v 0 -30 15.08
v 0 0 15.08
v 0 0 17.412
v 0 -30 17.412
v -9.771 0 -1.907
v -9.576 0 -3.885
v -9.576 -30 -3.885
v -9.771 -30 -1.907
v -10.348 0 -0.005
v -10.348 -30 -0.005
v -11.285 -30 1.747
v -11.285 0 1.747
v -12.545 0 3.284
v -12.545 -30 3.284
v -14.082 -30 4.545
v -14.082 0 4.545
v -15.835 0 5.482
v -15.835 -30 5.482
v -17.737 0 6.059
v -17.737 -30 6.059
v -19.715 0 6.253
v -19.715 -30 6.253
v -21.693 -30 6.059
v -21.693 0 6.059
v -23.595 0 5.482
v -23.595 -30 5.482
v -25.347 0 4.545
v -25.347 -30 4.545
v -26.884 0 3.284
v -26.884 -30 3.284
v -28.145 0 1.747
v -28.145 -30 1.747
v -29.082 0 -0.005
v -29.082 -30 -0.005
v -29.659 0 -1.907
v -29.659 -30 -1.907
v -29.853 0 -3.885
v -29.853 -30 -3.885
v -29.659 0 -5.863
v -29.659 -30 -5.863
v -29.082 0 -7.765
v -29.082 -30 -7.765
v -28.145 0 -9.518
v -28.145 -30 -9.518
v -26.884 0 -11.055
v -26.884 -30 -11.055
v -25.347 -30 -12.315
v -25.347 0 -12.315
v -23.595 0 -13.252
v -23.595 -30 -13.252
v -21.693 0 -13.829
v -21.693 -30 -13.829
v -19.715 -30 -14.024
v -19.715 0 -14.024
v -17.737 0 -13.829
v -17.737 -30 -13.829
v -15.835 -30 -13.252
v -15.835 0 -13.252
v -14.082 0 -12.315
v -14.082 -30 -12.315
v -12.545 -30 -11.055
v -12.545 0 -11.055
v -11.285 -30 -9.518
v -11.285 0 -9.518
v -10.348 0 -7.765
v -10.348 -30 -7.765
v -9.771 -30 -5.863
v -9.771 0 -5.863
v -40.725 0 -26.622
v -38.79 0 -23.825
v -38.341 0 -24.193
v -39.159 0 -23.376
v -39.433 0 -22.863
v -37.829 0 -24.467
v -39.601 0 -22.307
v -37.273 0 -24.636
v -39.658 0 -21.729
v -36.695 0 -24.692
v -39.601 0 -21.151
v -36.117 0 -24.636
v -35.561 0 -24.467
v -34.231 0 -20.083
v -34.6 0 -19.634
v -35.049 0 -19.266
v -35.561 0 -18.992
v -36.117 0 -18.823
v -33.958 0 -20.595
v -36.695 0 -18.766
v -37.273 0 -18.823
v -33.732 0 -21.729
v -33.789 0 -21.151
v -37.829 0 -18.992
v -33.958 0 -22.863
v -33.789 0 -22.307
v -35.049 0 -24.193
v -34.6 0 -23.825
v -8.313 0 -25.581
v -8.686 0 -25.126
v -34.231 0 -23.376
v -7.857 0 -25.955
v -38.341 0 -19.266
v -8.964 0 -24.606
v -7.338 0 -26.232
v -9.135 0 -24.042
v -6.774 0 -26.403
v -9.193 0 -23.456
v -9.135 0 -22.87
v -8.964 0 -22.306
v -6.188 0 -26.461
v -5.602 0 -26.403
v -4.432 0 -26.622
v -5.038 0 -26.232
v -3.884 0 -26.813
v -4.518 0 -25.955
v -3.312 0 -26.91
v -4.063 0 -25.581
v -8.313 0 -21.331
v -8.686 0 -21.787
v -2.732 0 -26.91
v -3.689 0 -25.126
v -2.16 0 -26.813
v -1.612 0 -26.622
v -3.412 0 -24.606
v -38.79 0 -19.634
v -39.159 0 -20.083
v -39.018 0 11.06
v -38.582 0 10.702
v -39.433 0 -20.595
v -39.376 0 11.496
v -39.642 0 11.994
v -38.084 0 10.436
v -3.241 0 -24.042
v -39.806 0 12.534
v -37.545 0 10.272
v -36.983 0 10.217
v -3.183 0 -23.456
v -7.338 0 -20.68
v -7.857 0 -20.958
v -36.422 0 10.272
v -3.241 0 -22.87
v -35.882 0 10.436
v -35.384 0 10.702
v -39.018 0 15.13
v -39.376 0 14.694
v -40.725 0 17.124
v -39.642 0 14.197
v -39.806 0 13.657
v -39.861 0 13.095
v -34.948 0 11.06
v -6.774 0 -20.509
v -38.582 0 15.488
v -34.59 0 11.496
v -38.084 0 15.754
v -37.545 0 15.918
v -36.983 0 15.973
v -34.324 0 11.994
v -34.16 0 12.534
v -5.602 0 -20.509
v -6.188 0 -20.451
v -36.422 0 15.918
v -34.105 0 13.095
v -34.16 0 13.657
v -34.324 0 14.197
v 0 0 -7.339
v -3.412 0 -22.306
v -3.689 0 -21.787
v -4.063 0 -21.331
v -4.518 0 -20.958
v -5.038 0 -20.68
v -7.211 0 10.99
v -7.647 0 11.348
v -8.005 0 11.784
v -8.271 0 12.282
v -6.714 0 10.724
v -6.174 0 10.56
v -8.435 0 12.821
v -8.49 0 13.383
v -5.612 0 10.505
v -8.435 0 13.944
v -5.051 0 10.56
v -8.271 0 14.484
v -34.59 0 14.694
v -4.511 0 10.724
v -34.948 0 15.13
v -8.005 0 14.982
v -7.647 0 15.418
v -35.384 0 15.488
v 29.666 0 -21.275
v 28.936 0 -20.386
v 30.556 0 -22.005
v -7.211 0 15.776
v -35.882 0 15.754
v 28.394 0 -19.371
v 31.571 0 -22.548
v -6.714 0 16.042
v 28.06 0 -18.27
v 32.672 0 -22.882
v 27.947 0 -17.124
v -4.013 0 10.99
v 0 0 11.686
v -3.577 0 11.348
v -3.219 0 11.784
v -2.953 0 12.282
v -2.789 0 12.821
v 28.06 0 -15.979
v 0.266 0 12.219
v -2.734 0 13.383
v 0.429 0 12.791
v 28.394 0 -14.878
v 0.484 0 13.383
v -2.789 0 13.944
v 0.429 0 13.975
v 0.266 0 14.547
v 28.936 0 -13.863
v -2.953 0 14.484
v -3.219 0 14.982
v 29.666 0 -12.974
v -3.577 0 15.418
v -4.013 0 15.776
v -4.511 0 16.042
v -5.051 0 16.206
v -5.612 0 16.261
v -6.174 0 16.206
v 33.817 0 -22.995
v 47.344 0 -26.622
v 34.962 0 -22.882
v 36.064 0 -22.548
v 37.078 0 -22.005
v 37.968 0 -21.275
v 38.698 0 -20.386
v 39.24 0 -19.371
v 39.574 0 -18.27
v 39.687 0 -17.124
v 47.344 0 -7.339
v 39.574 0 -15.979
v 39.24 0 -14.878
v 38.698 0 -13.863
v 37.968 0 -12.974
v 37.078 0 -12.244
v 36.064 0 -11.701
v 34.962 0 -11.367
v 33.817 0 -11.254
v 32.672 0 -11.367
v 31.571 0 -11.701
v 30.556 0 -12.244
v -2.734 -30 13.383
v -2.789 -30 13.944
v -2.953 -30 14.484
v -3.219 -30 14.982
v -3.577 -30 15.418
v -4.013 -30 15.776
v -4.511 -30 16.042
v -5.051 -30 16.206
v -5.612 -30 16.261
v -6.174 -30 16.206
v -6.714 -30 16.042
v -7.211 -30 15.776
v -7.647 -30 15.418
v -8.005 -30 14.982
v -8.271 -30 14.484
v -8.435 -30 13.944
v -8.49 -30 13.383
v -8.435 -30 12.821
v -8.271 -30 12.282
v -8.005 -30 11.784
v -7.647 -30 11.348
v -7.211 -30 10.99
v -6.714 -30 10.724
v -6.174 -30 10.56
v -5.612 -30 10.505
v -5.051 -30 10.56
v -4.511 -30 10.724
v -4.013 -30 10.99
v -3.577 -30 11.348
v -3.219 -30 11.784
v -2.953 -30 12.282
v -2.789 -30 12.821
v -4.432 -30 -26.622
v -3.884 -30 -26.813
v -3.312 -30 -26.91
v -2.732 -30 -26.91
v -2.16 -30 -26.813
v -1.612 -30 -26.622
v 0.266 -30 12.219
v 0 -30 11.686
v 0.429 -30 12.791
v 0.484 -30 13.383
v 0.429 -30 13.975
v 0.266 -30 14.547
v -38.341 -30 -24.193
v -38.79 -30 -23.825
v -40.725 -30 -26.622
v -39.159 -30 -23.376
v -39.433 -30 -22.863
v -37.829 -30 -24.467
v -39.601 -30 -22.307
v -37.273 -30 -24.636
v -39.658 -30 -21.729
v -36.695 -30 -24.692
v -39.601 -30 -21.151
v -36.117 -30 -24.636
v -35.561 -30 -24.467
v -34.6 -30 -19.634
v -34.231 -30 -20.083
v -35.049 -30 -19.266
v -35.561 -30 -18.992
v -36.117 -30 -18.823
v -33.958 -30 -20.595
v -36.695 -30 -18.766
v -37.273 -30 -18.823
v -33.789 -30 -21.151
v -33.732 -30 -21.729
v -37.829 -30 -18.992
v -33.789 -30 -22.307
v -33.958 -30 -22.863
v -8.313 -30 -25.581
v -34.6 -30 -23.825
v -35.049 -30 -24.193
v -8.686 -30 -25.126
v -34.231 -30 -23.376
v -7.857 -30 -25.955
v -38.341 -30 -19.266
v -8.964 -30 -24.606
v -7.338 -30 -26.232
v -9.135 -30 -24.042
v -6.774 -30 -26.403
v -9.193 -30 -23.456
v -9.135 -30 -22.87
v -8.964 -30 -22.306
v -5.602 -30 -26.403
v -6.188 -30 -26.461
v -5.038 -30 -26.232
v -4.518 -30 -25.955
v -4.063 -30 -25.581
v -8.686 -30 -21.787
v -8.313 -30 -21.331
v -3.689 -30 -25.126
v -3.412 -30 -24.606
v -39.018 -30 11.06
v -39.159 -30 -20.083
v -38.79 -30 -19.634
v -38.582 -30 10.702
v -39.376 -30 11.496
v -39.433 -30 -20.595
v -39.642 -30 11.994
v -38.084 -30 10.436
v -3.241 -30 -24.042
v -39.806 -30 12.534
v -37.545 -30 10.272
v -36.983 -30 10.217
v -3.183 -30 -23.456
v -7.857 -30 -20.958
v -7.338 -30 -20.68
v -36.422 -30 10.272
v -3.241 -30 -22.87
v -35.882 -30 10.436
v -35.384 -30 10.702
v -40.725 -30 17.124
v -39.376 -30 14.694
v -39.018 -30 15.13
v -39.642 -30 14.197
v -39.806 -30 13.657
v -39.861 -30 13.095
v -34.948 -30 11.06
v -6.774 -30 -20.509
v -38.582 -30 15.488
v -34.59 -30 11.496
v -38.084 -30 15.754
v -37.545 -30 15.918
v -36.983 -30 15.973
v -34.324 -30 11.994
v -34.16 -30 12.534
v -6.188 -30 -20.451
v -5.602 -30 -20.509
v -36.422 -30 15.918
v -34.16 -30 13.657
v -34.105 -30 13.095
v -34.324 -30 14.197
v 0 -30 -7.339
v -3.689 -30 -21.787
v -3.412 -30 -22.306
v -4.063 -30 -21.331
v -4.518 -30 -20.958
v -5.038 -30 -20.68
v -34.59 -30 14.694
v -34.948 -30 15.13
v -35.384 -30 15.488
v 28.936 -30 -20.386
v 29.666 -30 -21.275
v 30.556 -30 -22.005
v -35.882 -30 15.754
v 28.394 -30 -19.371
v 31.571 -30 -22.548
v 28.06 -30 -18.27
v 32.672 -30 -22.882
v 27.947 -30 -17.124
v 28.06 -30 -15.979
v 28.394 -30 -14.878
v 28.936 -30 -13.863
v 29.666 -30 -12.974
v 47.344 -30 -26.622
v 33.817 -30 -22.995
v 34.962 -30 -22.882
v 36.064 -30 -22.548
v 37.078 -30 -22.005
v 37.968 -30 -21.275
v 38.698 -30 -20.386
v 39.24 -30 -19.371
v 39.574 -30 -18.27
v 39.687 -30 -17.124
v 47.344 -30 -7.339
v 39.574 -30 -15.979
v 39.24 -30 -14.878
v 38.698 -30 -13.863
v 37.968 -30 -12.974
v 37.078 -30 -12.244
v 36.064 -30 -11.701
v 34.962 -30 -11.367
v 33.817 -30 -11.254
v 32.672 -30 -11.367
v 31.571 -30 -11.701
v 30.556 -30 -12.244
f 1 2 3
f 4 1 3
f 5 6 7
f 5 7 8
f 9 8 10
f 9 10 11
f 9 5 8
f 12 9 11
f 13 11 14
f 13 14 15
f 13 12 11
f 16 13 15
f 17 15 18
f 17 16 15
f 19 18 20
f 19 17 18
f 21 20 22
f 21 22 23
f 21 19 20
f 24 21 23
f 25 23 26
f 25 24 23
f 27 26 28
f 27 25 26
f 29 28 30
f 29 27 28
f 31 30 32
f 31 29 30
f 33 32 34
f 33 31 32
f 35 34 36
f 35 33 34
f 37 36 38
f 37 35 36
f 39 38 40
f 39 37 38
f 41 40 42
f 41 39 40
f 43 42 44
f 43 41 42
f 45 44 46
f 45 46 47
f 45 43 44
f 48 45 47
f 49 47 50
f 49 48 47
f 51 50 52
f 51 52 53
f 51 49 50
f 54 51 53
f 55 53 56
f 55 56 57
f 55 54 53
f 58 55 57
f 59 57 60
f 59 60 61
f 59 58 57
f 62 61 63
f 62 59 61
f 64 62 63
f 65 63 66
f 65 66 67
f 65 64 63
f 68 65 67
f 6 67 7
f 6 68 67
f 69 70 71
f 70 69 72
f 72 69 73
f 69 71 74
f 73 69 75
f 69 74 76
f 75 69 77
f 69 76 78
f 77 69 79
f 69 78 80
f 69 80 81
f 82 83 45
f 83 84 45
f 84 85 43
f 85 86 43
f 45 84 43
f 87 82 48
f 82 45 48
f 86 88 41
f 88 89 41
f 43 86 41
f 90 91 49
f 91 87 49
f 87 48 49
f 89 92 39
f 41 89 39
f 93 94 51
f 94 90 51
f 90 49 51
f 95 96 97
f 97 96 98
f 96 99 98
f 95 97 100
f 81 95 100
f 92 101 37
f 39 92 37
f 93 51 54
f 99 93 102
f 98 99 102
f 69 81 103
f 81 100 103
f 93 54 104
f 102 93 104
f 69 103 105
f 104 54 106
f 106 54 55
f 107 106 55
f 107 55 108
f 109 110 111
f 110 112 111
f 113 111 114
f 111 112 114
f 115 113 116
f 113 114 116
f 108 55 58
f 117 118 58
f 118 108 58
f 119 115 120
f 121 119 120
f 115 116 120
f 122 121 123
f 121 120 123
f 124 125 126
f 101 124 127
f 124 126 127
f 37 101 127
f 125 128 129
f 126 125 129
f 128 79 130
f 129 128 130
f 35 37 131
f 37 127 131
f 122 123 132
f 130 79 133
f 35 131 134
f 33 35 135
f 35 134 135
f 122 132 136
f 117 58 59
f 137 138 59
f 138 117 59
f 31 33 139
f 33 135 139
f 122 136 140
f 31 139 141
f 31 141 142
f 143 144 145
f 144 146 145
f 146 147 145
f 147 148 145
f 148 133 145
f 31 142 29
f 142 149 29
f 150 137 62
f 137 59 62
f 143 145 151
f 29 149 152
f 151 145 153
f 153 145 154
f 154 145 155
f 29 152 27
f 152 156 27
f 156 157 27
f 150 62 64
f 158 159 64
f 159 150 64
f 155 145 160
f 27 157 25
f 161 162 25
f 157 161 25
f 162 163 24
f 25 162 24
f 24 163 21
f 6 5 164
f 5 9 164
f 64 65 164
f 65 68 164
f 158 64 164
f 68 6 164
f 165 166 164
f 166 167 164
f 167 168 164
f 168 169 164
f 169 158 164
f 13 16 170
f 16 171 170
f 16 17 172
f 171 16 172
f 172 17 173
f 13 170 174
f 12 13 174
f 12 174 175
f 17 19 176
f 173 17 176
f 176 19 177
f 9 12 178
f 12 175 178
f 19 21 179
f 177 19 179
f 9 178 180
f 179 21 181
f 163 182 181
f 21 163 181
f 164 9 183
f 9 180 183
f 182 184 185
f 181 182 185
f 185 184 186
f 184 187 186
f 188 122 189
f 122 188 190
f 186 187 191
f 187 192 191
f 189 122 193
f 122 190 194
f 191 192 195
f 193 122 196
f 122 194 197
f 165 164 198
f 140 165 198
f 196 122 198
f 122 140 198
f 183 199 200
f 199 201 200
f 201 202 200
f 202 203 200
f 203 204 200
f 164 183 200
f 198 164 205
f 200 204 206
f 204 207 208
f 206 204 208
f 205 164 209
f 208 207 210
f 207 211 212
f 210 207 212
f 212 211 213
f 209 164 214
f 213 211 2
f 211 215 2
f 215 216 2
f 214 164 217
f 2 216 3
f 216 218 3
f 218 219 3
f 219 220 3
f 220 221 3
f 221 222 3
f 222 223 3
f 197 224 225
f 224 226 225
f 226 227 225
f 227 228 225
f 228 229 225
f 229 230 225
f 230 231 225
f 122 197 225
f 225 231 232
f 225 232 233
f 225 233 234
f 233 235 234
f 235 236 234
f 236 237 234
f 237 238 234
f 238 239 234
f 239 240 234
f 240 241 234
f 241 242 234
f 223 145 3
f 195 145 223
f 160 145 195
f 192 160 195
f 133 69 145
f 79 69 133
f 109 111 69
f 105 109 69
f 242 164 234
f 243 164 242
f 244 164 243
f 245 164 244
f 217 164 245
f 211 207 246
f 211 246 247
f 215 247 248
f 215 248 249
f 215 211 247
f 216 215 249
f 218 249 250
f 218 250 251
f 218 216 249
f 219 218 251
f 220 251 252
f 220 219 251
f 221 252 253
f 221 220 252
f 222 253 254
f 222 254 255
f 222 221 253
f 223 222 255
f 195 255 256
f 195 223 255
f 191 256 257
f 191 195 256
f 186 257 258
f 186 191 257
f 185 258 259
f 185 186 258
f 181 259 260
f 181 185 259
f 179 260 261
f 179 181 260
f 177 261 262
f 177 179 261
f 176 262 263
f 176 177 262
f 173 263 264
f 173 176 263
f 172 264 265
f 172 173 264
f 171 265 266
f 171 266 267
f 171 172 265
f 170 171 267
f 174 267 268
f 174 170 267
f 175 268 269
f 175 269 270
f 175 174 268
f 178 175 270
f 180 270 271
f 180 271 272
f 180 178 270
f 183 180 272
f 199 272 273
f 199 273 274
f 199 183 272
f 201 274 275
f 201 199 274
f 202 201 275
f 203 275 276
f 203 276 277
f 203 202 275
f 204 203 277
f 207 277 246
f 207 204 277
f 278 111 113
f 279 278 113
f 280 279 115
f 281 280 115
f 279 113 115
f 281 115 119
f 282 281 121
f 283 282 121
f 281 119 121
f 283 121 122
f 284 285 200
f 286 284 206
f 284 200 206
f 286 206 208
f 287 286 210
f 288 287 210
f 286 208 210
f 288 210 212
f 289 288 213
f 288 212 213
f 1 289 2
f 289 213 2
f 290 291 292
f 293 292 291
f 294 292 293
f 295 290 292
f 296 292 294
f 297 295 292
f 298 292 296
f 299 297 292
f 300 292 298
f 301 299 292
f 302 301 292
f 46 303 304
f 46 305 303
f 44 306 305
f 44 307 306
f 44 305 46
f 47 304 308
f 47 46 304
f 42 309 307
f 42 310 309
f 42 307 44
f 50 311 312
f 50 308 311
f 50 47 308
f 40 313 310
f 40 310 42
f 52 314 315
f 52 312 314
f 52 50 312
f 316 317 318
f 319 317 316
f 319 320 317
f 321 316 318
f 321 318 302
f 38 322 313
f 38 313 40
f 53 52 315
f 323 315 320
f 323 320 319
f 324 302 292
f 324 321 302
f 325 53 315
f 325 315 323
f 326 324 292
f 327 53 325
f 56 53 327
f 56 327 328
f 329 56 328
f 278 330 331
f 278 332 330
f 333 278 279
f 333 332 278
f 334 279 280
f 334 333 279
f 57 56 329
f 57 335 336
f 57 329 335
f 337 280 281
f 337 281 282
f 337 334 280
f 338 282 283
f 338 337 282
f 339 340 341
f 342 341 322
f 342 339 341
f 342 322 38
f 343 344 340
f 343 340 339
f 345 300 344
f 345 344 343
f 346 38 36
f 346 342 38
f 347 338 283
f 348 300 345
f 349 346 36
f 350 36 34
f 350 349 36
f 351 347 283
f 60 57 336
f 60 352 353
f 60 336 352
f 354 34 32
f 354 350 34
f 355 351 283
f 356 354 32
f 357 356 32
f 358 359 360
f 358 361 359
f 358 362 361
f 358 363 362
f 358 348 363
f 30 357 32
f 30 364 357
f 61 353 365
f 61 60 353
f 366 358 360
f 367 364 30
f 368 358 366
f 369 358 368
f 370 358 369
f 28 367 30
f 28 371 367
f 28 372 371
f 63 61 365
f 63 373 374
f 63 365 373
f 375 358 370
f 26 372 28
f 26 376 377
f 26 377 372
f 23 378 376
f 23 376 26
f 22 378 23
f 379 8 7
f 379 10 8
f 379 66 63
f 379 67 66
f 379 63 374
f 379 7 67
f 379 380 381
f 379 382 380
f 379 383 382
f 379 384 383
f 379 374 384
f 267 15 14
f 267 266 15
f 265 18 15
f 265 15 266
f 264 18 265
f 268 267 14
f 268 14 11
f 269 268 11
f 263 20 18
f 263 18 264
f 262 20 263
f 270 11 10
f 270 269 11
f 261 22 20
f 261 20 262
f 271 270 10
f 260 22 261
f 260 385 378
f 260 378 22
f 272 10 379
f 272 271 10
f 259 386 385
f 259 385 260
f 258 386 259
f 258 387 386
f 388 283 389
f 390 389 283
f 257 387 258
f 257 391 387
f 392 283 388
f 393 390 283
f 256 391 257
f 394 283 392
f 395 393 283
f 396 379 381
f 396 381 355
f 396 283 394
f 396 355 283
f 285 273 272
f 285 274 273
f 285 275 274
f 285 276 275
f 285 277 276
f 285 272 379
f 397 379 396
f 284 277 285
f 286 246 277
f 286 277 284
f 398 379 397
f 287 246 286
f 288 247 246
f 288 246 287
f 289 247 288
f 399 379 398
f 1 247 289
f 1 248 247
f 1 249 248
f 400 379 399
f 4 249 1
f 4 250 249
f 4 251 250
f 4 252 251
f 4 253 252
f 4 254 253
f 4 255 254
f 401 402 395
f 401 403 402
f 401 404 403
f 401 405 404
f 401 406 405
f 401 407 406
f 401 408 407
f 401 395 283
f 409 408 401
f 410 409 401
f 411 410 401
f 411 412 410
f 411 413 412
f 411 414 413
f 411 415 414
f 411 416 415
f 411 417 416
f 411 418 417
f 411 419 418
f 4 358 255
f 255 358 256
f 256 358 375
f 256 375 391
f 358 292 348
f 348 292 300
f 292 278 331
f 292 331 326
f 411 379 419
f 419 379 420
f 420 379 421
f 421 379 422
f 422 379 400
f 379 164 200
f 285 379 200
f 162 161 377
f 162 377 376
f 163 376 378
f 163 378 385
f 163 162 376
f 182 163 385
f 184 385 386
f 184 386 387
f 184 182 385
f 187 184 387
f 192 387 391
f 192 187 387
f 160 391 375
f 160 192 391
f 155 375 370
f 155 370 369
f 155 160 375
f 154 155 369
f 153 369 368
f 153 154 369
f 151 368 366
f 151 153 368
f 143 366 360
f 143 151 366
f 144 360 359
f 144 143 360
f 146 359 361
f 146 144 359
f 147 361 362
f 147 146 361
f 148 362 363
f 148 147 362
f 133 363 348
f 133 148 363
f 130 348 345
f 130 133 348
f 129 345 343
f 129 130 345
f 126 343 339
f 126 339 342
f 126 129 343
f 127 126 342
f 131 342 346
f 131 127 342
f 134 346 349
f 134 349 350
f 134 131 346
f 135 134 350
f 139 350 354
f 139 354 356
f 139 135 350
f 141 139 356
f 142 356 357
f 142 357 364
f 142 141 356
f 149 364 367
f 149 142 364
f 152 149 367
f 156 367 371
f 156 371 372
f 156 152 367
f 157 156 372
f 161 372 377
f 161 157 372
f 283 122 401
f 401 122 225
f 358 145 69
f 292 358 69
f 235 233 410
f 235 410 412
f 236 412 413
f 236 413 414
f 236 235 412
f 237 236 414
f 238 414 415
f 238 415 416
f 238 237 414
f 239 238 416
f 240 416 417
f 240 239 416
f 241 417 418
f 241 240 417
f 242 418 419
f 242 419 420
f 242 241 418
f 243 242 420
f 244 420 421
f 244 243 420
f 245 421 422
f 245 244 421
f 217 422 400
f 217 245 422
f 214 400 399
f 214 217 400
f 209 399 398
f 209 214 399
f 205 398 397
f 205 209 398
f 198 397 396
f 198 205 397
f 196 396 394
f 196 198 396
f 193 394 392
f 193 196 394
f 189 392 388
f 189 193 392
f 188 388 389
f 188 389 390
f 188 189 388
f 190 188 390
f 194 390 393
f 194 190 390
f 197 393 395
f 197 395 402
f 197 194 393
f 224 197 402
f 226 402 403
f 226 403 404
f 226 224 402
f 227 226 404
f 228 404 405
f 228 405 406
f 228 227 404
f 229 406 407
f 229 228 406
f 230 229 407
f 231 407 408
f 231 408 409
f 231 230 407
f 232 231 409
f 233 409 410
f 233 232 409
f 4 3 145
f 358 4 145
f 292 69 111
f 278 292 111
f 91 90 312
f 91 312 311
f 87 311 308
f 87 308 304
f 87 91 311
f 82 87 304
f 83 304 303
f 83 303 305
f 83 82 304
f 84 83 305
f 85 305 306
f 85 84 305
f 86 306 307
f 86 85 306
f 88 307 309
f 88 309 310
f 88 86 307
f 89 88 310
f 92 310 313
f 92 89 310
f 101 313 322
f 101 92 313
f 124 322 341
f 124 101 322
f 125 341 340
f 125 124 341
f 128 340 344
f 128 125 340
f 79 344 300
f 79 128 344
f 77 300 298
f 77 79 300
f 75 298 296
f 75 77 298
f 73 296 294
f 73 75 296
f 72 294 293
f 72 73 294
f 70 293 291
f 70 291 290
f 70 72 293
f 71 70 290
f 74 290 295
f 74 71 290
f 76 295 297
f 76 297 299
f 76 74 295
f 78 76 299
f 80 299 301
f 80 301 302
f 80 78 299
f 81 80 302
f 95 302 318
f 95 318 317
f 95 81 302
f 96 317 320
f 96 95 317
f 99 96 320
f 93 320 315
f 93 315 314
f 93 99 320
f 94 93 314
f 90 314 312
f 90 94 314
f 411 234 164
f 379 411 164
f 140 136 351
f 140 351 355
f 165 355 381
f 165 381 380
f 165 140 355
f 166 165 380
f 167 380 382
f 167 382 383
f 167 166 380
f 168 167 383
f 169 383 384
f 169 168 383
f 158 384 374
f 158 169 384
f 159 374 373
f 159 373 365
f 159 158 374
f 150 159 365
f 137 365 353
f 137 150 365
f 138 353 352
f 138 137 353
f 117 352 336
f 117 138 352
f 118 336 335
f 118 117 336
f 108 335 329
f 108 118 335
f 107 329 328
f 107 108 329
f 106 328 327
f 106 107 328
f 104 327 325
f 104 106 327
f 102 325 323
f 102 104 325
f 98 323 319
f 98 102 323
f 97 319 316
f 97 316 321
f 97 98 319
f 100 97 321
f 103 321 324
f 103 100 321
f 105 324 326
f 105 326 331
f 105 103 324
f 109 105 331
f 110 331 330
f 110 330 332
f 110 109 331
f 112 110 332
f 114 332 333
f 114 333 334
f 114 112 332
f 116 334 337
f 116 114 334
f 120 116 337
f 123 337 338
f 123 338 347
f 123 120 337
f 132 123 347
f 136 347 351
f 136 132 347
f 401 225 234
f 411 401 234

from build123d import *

# Parameters (mm, degrees)
F0_R     = 2.963143
F0_R_2   = 3.00478
F0_R_3   = 5.870107
F0_R_4   = 10.138773
F0_R_5   = 2.878059
F0_R_6   = 2.878057
F1_DEPTH = 30


with BuildPart() as f1:
    # F0 (on Front) → F1 (new body)
    with BuildSketch(Plane.XZ):
        Polygon((0, 17.412249), (-40.724516, 17.124442), (-40.724516, -26.622033), (-4.431914, -26.622033), (-1.612007, -26.622033), (47.344048, -26.622033), (47.344048, -7.339047), (0, -7.339047), (0, 11.686382), (0, 15.079555), align=None)
        with Locations((-36.695234, -21.729333)):
            Circle(F0_R, mode=Mode.SUBTRACT)
        with Locations((-6.187823, -23.456169)):
            Circle(F0_R_2, mode=Mode.SUBTRACT)
        with Locations((33.81718, -17.124442)):
            Circle(F0_R_3, mode=Mode.SUBTRACT)
        with Locations((-19.714694, -3.885378)):
            Circle(F0_R_4, mode=Mode.SUBTRACT)
        with Locations((-36.983039, 13.095162)):
            Circle(F0_R_5, mode=Mode.SUBTRACT)
        with Locations((-5.612212, 13.382968)):
            Circle(F0_R_6, mode=Mode.SUBTRACT)
        with BuildLine():
            Line((-1.612007, -26.622033), (-4.431914, -26.622033))
            ThreePointArc((-4.431914, -26.622033), (-3.021961, -26.921809), (-1.612007, -26.622033))
        make_face()
        with BuildLine():
            ThreePointArc((0, 11.686382), (0.48361, 13.382968), (0, 15.079555))
            Line((0, 15.079555), (0, 11.686382))
        make_face()
    extrude(amount=F1_DEPTH)


solid = f1.part
